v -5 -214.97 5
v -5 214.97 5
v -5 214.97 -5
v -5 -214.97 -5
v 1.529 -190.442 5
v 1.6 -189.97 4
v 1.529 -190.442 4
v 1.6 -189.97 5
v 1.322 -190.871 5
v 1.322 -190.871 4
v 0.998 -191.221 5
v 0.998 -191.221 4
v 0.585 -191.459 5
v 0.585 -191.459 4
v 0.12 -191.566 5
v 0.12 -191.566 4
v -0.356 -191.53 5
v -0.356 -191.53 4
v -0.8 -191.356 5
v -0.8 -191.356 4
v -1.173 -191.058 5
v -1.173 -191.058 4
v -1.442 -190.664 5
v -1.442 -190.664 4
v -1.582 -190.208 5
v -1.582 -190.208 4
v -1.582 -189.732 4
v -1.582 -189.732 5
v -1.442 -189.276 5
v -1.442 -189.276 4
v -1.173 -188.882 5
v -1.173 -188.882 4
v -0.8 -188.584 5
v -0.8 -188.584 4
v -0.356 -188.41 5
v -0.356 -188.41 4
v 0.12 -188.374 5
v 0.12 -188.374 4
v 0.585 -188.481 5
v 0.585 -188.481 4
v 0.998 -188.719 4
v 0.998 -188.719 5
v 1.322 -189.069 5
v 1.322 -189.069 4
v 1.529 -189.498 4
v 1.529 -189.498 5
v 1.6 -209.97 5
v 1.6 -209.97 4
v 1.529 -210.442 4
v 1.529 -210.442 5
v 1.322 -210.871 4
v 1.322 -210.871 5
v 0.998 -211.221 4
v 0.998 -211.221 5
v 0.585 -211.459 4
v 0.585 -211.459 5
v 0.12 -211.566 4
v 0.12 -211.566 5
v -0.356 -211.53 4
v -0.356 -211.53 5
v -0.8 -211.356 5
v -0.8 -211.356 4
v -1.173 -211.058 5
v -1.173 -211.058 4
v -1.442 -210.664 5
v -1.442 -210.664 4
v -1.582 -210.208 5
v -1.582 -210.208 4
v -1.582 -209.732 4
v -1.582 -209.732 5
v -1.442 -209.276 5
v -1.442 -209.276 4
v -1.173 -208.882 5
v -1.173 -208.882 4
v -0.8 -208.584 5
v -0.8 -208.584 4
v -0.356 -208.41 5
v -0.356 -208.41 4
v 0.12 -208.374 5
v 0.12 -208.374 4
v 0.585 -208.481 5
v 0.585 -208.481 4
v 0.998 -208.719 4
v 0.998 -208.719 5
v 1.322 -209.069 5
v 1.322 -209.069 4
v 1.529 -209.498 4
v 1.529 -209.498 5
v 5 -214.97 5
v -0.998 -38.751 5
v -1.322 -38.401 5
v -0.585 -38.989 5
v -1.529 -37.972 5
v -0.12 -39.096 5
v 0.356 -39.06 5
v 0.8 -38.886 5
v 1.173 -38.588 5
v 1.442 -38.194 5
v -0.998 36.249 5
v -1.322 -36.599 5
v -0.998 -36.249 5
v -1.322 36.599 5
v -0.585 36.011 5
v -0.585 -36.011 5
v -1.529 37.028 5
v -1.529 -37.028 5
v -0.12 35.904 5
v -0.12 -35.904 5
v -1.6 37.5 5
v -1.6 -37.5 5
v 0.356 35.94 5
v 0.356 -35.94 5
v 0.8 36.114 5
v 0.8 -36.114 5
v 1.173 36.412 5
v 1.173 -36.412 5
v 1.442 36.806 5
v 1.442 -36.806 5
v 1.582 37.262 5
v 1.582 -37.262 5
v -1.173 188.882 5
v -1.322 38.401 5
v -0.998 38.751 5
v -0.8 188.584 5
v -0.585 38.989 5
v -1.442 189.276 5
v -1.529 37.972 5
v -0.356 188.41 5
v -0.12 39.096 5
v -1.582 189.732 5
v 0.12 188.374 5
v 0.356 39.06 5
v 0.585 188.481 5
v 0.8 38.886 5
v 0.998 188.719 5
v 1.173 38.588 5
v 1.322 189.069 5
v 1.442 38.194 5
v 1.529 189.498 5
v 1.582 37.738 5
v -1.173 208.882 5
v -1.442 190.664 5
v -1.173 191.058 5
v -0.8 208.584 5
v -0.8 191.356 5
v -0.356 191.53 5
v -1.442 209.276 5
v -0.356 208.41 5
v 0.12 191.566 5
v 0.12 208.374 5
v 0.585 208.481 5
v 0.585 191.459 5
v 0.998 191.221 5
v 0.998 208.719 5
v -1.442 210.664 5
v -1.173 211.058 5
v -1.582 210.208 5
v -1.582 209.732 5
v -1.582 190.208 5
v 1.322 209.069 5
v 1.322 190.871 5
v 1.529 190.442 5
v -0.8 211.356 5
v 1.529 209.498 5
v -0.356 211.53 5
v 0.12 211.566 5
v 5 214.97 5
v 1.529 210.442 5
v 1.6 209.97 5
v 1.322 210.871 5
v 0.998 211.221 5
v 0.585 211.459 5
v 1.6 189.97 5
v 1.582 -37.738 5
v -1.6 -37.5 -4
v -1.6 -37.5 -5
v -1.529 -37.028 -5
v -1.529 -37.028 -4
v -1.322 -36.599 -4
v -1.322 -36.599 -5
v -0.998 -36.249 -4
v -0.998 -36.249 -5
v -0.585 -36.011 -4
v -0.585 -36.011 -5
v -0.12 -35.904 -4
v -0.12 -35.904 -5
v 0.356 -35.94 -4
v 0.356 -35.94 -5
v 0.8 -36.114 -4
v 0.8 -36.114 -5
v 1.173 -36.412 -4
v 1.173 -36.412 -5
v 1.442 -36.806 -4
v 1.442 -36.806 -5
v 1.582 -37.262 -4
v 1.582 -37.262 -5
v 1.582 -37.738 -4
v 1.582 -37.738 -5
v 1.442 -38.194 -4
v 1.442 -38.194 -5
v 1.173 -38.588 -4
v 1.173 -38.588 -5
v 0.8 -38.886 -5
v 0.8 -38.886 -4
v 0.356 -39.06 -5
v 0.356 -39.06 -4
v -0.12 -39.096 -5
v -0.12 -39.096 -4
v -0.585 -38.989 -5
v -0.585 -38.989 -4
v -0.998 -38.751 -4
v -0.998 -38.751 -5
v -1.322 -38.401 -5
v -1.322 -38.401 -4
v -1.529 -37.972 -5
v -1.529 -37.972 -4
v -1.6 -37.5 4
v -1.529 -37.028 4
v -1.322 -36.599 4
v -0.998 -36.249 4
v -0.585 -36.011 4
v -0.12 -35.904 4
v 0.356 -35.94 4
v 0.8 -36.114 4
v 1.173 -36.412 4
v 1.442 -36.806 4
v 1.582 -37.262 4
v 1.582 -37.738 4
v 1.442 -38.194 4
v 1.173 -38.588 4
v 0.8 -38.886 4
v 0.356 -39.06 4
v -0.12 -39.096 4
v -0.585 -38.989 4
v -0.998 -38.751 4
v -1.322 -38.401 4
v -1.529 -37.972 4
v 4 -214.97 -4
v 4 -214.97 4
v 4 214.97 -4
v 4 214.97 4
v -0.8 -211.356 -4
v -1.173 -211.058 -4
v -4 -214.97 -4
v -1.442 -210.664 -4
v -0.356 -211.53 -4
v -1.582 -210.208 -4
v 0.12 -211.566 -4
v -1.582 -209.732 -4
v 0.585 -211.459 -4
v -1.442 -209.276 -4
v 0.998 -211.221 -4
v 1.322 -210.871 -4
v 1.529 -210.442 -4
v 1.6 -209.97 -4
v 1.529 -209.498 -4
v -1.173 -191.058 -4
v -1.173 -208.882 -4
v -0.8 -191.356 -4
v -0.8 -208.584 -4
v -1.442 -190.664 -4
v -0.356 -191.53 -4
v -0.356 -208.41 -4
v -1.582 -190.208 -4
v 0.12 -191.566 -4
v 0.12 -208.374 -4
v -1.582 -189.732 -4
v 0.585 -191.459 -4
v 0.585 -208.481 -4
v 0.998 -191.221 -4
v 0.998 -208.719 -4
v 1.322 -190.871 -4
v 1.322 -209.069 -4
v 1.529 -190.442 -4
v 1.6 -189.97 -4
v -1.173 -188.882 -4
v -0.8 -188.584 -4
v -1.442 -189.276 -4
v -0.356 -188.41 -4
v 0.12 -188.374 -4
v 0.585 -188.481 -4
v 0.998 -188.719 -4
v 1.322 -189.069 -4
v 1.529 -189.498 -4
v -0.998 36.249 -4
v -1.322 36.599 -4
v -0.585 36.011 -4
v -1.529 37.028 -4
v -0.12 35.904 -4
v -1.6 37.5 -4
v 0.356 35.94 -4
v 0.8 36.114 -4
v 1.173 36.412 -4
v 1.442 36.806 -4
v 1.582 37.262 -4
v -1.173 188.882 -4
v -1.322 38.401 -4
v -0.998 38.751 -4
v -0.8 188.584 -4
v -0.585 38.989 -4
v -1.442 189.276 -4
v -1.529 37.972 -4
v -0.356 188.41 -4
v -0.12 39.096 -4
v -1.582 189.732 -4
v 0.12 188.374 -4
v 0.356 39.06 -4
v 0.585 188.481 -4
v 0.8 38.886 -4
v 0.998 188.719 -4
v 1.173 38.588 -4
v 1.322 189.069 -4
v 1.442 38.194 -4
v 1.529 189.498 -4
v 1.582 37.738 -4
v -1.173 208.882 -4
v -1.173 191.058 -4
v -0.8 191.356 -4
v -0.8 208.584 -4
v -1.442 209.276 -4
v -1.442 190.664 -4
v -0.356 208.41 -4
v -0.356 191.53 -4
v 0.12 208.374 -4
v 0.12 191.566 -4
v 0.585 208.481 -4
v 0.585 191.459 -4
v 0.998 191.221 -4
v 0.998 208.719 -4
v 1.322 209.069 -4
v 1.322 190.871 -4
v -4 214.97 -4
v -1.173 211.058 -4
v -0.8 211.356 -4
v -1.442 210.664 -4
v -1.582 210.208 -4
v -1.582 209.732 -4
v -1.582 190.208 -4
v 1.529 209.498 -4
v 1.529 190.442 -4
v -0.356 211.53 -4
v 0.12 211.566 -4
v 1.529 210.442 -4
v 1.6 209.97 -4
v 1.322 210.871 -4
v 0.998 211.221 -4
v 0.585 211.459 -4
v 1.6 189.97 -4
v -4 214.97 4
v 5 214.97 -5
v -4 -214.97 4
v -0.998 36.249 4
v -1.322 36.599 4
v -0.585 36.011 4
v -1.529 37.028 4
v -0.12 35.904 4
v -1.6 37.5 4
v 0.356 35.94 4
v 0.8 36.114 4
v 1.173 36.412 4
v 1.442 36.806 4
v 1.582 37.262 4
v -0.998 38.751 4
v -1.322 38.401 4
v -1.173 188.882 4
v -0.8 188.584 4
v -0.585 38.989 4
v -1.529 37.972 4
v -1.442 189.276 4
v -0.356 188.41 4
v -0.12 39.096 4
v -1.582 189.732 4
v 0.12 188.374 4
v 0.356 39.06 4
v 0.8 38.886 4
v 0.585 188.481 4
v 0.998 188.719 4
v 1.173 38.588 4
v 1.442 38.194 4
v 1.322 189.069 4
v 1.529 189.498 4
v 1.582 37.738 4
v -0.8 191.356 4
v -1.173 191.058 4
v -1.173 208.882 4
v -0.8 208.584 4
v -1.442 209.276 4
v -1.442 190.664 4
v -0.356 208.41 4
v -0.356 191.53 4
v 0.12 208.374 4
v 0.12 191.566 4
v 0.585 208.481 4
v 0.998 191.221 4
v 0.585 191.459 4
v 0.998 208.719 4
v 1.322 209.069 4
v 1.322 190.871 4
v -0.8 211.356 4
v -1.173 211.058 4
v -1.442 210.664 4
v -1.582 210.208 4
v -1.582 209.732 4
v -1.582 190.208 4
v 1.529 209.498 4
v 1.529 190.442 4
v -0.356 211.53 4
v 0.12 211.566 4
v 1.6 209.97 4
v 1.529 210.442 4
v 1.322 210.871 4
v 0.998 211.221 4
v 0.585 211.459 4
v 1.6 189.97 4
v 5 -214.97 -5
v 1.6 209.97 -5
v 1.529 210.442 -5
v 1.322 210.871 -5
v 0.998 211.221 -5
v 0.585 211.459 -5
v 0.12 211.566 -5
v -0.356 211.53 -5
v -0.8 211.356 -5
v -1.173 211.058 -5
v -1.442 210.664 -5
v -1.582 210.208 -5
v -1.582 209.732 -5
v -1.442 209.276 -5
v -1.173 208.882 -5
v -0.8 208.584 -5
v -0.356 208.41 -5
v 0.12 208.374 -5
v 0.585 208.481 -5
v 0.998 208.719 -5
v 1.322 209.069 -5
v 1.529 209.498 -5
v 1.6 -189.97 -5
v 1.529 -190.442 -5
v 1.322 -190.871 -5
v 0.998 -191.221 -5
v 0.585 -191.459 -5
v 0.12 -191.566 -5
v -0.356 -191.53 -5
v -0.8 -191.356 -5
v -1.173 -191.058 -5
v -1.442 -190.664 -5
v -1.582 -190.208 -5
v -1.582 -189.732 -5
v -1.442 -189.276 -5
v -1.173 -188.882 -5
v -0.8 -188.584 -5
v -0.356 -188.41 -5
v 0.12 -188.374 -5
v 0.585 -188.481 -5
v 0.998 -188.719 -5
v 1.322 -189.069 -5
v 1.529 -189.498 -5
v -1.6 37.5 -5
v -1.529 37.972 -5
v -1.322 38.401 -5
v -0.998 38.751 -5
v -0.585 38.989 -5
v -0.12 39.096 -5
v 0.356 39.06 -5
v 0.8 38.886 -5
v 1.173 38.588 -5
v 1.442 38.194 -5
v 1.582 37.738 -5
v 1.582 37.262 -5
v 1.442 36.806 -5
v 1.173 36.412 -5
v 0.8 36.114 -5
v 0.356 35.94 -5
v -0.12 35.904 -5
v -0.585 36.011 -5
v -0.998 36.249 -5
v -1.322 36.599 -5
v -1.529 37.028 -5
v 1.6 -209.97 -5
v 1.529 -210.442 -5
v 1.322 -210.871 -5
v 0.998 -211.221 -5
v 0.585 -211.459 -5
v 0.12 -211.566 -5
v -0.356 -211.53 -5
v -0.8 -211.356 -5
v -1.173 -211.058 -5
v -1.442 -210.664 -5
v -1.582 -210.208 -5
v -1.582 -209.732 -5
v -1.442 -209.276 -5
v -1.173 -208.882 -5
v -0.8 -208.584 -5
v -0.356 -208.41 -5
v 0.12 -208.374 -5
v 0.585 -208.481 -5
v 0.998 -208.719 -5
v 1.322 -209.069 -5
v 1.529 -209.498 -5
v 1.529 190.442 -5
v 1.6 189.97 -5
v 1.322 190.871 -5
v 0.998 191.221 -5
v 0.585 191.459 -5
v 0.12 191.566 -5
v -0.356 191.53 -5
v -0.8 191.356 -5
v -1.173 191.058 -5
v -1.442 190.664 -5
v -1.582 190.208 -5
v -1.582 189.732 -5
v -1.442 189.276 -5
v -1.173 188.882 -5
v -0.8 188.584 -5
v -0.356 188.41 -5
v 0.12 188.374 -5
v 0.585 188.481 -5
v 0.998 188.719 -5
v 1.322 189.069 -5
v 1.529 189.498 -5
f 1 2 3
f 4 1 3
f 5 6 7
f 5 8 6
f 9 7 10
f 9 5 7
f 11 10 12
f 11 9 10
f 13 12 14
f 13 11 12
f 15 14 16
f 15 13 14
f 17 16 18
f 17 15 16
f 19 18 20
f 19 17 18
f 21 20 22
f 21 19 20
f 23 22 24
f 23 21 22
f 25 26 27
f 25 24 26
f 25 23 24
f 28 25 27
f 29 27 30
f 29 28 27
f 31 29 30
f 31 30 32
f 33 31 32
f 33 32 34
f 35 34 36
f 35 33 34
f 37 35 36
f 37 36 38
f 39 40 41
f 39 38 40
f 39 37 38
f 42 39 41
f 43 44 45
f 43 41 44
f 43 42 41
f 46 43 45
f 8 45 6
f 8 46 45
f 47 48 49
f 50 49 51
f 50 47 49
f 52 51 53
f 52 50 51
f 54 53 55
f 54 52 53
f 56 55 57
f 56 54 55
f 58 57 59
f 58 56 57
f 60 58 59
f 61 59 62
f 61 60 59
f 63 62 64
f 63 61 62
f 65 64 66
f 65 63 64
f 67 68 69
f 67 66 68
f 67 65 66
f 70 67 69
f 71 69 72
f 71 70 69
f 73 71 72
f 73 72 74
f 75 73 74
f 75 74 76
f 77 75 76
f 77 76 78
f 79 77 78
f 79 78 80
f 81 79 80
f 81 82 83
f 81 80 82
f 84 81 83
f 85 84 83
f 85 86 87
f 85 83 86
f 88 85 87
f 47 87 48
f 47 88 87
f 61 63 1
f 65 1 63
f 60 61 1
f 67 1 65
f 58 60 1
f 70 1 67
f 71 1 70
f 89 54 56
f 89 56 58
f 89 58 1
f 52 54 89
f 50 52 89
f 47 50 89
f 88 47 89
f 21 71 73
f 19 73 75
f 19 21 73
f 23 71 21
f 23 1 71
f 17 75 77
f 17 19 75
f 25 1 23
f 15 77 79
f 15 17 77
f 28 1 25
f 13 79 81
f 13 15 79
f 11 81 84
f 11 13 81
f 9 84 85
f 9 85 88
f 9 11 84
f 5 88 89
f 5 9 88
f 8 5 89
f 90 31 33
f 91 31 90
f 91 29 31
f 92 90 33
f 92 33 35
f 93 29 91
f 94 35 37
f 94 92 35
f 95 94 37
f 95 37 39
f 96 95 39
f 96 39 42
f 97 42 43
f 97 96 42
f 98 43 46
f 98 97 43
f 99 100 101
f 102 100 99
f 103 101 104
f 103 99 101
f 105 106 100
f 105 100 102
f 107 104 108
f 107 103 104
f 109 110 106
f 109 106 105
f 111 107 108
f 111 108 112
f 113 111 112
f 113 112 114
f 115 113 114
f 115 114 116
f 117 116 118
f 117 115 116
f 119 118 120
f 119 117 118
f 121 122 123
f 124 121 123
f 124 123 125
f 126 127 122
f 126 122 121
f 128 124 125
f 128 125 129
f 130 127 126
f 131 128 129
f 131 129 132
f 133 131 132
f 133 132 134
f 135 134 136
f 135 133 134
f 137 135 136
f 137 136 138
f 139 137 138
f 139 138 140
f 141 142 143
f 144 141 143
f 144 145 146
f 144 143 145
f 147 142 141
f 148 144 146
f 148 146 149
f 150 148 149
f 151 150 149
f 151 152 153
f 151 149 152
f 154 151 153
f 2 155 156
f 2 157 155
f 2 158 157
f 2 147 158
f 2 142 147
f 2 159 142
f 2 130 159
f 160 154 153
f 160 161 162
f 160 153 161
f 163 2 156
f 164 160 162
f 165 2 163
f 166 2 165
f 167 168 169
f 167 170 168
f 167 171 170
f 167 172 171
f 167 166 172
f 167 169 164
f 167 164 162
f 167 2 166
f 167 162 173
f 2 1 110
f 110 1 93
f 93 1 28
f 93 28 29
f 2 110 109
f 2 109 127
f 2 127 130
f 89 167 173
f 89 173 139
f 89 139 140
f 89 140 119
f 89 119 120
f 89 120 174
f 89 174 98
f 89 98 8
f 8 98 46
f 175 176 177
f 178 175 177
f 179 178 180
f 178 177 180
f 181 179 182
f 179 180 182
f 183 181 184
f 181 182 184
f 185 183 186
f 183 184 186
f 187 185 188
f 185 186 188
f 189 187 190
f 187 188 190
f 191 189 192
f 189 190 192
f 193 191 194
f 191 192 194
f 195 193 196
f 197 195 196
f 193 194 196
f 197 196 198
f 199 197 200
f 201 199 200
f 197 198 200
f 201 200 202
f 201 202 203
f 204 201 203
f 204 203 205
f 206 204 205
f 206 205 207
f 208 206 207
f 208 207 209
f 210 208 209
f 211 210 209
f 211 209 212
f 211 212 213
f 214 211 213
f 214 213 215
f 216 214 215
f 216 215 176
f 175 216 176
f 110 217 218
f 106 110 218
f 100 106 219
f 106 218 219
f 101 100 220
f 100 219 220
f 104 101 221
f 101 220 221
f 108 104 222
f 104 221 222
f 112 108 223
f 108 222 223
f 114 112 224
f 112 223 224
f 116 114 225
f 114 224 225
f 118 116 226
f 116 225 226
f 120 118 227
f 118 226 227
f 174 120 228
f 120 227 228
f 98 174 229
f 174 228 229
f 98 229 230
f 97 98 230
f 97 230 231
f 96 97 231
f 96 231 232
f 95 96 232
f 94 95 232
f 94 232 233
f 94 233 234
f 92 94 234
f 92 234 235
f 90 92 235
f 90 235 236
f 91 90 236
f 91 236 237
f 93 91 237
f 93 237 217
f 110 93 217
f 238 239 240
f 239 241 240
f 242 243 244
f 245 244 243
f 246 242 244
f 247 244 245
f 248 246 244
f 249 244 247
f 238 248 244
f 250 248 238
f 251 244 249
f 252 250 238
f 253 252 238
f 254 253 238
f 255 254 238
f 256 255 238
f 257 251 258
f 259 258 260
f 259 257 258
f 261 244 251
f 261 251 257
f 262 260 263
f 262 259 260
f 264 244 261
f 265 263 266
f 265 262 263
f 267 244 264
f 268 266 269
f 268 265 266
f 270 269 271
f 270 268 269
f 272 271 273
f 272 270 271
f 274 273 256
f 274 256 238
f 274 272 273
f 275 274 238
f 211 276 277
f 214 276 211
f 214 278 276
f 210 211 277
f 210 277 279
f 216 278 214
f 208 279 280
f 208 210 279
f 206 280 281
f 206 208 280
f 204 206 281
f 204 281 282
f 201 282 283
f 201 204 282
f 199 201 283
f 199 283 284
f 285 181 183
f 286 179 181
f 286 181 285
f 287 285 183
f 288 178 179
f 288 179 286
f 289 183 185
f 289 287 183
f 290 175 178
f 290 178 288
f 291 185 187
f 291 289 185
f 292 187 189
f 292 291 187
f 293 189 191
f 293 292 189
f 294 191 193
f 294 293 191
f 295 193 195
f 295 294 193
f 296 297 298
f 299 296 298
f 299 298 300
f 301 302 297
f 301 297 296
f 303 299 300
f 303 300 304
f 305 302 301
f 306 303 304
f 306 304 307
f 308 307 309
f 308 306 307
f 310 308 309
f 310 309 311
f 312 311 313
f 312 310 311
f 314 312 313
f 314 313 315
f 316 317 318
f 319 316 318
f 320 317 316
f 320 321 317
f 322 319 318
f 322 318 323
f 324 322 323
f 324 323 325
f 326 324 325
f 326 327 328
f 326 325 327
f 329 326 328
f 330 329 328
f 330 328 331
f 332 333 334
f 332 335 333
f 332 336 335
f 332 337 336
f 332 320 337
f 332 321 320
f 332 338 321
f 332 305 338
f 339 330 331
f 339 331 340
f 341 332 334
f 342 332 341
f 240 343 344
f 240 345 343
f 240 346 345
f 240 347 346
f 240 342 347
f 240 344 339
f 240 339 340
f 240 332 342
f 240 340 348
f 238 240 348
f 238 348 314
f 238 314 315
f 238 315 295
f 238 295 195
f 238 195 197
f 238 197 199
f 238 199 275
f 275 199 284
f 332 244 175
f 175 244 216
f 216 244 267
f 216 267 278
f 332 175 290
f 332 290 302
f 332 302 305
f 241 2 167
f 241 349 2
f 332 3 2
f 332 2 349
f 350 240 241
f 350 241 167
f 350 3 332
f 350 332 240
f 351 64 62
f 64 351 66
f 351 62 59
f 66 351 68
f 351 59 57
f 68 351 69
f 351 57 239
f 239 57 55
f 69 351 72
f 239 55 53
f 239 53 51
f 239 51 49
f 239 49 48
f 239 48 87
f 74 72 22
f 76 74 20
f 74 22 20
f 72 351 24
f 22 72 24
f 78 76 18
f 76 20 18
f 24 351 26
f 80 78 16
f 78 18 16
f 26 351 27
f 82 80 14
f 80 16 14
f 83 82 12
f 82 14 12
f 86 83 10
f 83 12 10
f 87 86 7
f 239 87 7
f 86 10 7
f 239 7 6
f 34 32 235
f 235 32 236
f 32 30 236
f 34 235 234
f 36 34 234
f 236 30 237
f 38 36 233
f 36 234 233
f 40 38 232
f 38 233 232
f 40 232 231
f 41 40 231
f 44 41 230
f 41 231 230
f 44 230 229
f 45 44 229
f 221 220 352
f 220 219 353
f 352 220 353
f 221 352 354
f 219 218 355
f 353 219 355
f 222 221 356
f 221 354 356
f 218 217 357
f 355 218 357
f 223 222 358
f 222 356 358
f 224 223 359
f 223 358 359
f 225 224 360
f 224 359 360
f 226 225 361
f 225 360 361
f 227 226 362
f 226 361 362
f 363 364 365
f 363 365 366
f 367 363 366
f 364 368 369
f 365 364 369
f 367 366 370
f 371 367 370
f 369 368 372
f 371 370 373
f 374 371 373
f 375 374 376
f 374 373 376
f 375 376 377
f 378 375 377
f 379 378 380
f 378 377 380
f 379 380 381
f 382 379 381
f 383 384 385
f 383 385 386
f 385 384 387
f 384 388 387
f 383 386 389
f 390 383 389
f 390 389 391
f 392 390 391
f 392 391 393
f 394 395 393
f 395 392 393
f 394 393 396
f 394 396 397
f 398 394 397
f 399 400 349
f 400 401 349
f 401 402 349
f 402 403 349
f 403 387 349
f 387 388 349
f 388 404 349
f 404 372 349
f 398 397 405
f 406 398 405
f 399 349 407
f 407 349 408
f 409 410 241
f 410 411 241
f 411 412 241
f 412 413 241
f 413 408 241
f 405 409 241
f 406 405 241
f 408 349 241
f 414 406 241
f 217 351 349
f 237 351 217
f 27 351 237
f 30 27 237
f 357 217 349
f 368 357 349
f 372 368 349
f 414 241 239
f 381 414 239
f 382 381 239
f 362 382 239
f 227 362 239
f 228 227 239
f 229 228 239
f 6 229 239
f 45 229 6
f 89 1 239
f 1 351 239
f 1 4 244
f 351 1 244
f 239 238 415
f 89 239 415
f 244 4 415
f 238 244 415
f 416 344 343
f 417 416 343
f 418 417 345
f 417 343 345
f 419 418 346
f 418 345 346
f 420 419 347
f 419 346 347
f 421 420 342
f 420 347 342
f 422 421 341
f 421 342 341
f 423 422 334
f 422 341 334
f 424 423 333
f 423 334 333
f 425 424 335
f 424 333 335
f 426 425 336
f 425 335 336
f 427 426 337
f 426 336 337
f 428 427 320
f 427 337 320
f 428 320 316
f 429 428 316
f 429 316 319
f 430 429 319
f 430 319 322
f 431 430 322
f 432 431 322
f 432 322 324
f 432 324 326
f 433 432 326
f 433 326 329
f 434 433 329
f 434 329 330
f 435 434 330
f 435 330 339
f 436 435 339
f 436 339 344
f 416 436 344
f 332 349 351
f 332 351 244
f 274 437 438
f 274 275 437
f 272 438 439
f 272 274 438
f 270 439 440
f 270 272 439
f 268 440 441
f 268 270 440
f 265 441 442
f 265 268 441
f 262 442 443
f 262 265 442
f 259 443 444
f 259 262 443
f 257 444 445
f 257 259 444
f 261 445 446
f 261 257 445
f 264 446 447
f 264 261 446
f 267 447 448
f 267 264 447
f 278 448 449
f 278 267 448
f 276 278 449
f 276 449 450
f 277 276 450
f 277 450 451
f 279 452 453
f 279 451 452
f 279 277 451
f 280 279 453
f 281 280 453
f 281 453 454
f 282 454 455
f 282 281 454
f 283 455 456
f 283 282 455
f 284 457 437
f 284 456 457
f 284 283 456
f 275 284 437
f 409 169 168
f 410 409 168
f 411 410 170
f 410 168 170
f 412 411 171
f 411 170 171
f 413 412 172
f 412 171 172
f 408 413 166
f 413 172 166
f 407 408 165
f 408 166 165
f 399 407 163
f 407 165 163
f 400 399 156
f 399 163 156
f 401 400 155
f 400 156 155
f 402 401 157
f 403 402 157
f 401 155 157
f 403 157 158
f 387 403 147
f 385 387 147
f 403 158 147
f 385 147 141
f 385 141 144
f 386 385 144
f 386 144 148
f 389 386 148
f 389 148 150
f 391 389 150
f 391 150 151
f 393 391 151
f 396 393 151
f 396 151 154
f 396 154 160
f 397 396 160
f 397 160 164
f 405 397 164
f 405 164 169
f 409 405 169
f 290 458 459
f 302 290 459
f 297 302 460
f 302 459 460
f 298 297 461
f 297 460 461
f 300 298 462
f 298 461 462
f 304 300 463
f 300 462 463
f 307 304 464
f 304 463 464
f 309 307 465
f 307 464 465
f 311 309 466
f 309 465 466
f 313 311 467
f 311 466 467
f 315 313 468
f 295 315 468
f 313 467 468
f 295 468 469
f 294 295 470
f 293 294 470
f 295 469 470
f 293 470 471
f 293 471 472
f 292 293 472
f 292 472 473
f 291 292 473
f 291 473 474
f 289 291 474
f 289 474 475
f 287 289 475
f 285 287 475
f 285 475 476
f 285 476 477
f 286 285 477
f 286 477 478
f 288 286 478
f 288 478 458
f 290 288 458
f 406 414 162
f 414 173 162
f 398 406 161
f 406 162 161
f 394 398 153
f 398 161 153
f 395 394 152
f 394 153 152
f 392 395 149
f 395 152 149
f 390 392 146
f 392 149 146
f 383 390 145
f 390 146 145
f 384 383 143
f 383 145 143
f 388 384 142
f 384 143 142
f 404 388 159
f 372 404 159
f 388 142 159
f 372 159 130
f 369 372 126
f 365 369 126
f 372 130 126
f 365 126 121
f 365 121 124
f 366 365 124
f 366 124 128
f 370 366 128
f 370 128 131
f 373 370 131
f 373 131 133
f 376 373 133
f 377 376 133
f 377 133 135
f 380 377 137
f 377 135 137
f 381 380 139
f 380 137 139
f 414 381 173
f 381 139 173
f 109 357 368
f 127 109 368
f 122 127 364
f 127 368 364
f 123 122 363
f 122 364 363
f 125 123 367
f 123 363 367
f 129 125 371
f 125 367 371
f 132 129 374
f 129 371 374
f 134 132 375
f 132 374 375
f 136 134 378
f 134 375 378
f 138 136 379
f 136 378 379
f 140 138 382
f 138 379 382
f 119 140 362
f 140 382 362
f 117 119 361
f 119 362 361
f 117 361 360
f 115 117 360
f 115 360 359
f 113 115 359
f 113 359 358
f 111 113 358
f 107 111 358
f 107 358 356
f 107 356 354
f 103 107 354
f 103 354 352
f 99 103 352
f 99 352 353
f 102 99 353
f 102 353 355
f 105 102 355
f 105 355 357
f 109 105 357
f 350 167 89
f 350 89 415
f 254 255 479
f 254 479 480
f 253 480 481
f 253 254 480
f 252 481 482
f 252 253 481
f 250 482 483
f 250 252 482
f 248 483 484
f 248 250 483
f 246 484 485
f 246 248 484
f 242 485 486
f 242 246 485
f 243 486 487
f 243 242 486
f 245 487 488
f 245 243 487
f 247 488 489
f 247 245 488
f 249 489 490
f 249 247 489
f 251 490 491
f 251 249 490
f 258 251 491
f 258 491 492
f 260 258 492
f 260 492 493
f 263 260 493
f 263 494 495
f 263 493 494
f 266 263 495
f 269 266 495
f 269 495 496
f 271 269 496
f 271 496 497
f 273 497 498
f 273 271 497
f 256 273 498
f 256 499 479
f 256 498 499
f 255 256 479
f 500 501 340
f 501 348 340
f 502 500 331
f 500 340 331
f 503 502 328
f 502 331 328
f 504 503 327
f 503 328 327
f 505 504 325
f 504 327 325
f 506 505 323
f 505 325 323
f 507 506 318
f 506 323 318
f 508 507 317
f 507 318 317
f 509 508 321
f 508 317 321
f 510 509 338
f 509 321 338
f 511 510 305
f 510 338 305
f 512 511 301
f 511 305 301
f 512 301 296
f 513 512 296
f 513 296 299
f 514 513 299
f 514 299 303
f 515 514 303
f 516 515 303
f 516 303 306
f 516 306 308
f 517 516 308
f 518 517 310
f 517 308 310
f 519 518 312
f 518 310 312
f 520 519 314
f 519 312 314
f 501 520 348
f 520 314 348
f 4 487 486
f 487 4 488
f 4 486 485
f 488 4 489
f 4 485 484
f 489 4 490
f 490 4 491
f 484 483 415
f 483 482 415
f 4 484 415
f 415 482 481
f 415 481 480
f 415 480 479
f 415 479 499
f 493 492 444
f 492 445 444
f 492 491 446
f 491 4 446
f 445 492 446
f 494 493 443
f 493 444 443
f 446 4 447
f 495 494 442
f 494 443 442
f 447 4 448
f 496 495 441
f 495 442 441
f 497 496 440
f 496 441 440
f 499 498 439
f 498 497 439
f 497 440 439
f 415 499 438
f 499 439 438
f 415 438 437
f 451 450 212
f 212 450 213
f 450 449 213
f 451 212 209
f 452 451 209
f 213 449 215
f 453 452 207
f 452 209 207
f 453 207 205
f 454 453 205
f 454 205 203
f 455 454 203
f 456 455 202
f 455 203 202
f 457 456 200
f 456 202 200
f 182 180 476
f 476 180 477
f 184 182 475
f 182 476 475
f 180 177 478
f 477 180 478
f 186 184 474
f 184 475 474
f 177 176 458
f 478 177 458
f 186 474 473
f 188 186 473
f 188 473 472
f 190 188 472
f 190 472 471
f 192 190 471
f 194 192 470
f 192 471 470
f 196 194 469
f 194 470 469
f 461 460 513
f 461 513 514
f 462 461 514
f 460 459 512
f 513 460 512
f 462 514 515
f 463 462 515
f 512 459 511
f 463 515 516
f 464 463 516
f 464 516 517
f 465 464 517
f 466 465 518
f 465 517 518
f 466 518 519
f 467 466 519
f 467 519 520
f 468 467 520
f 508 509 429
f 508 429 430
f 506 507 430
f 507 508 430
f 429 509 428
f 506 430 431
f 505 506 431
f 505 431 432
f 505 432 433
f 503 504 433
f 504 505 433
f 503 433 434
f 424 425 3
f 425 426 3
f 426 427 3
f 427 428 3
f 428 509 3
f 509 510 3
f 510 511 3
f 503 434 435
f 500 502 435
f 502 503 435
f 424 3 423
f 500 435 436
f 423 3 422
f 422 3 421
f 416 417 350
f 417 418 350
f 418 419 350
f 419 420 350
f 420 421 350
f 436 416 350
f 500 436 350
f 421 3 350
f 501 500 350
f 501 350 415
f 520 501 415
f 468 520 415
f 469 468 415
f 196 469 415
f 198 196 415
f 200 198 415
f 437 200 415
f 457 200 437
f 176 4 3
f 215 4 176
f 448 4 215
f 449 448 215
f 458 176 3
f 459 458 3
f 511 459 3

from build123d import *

# Parameters (mm, degrees)
SKETCH_1_W          = 10
SKETCH_1_H          = 10
SKETCH_1_W_2        = 8
SKETCH_1_H_2        = 8
EXTRUDE_1_DEPTH     = 214.97
SKETCH_2_R          = 1.6
CUT_EXTRUDE_1_DEPTH = 213.715
SKETCH_3_R          = 1.6
CUT_EXTRUDE_2_DEPTH = 10


with BuildPart() as part:
    # ｽｹｯﾁ1 → ﾎﾞｽ - 押し出し1 (new, symmetric)
    with BuildSketch(Plane(origin=(0, 0, 0), x_dir=(1, 0, 0), z_dir=(0, 1, 0))):
        Rectangle(SKETCH_1_W, SKETCH_1_H)
        Rectangle(SKETCH_1_W_2, SKETCH_1_H_2, mode=Mode.SUBTRACT)
    extrude(amount=EXTRUDE_1_DEPTH, both=True)

    # ｽｹｯﾁ2 → ｶｯﾄ - 押し出し1 (cut, symmetric)
    with BuildSketch(Plane.XY.offset(5)):
        with Locations((0, 209.97)):
            Circle(SKETCH_2_R)
        with Locations((0, 189.97)):
            Circle(SKETCH_2_R)
    cut_extrude_1 = extrude(amount=CUT_EXTRUDE_1_DEPTH, both=True, mode=Mode.SUBTRACT)

    # ﾐﾗｰ1: ｶｯﾄ - 押し出し1 across plane
    add(cut_extrude_1.mirror(Plane.ZX), mode=Mode.SUBTRACT)

    # ｽｹｯﾁ3 → ｶｯﾄ - 押し出し2 (cut)
    with BuildSketch(Plane(origin=(0, 0, -5), x_dir=(-1, 0, 0), z_dir=(0, 0, -1))):
        with Locations((0, 37.5)):
            Circle(SKETCH_3_R)
        with Locations((0, -37.5)):
            Circle(SKETCH_3_R)
    extrude(amount=-CUT_EXTRUDE_2_DEPTH, mode=Mode.SUBTRACT)


solid = part.part
